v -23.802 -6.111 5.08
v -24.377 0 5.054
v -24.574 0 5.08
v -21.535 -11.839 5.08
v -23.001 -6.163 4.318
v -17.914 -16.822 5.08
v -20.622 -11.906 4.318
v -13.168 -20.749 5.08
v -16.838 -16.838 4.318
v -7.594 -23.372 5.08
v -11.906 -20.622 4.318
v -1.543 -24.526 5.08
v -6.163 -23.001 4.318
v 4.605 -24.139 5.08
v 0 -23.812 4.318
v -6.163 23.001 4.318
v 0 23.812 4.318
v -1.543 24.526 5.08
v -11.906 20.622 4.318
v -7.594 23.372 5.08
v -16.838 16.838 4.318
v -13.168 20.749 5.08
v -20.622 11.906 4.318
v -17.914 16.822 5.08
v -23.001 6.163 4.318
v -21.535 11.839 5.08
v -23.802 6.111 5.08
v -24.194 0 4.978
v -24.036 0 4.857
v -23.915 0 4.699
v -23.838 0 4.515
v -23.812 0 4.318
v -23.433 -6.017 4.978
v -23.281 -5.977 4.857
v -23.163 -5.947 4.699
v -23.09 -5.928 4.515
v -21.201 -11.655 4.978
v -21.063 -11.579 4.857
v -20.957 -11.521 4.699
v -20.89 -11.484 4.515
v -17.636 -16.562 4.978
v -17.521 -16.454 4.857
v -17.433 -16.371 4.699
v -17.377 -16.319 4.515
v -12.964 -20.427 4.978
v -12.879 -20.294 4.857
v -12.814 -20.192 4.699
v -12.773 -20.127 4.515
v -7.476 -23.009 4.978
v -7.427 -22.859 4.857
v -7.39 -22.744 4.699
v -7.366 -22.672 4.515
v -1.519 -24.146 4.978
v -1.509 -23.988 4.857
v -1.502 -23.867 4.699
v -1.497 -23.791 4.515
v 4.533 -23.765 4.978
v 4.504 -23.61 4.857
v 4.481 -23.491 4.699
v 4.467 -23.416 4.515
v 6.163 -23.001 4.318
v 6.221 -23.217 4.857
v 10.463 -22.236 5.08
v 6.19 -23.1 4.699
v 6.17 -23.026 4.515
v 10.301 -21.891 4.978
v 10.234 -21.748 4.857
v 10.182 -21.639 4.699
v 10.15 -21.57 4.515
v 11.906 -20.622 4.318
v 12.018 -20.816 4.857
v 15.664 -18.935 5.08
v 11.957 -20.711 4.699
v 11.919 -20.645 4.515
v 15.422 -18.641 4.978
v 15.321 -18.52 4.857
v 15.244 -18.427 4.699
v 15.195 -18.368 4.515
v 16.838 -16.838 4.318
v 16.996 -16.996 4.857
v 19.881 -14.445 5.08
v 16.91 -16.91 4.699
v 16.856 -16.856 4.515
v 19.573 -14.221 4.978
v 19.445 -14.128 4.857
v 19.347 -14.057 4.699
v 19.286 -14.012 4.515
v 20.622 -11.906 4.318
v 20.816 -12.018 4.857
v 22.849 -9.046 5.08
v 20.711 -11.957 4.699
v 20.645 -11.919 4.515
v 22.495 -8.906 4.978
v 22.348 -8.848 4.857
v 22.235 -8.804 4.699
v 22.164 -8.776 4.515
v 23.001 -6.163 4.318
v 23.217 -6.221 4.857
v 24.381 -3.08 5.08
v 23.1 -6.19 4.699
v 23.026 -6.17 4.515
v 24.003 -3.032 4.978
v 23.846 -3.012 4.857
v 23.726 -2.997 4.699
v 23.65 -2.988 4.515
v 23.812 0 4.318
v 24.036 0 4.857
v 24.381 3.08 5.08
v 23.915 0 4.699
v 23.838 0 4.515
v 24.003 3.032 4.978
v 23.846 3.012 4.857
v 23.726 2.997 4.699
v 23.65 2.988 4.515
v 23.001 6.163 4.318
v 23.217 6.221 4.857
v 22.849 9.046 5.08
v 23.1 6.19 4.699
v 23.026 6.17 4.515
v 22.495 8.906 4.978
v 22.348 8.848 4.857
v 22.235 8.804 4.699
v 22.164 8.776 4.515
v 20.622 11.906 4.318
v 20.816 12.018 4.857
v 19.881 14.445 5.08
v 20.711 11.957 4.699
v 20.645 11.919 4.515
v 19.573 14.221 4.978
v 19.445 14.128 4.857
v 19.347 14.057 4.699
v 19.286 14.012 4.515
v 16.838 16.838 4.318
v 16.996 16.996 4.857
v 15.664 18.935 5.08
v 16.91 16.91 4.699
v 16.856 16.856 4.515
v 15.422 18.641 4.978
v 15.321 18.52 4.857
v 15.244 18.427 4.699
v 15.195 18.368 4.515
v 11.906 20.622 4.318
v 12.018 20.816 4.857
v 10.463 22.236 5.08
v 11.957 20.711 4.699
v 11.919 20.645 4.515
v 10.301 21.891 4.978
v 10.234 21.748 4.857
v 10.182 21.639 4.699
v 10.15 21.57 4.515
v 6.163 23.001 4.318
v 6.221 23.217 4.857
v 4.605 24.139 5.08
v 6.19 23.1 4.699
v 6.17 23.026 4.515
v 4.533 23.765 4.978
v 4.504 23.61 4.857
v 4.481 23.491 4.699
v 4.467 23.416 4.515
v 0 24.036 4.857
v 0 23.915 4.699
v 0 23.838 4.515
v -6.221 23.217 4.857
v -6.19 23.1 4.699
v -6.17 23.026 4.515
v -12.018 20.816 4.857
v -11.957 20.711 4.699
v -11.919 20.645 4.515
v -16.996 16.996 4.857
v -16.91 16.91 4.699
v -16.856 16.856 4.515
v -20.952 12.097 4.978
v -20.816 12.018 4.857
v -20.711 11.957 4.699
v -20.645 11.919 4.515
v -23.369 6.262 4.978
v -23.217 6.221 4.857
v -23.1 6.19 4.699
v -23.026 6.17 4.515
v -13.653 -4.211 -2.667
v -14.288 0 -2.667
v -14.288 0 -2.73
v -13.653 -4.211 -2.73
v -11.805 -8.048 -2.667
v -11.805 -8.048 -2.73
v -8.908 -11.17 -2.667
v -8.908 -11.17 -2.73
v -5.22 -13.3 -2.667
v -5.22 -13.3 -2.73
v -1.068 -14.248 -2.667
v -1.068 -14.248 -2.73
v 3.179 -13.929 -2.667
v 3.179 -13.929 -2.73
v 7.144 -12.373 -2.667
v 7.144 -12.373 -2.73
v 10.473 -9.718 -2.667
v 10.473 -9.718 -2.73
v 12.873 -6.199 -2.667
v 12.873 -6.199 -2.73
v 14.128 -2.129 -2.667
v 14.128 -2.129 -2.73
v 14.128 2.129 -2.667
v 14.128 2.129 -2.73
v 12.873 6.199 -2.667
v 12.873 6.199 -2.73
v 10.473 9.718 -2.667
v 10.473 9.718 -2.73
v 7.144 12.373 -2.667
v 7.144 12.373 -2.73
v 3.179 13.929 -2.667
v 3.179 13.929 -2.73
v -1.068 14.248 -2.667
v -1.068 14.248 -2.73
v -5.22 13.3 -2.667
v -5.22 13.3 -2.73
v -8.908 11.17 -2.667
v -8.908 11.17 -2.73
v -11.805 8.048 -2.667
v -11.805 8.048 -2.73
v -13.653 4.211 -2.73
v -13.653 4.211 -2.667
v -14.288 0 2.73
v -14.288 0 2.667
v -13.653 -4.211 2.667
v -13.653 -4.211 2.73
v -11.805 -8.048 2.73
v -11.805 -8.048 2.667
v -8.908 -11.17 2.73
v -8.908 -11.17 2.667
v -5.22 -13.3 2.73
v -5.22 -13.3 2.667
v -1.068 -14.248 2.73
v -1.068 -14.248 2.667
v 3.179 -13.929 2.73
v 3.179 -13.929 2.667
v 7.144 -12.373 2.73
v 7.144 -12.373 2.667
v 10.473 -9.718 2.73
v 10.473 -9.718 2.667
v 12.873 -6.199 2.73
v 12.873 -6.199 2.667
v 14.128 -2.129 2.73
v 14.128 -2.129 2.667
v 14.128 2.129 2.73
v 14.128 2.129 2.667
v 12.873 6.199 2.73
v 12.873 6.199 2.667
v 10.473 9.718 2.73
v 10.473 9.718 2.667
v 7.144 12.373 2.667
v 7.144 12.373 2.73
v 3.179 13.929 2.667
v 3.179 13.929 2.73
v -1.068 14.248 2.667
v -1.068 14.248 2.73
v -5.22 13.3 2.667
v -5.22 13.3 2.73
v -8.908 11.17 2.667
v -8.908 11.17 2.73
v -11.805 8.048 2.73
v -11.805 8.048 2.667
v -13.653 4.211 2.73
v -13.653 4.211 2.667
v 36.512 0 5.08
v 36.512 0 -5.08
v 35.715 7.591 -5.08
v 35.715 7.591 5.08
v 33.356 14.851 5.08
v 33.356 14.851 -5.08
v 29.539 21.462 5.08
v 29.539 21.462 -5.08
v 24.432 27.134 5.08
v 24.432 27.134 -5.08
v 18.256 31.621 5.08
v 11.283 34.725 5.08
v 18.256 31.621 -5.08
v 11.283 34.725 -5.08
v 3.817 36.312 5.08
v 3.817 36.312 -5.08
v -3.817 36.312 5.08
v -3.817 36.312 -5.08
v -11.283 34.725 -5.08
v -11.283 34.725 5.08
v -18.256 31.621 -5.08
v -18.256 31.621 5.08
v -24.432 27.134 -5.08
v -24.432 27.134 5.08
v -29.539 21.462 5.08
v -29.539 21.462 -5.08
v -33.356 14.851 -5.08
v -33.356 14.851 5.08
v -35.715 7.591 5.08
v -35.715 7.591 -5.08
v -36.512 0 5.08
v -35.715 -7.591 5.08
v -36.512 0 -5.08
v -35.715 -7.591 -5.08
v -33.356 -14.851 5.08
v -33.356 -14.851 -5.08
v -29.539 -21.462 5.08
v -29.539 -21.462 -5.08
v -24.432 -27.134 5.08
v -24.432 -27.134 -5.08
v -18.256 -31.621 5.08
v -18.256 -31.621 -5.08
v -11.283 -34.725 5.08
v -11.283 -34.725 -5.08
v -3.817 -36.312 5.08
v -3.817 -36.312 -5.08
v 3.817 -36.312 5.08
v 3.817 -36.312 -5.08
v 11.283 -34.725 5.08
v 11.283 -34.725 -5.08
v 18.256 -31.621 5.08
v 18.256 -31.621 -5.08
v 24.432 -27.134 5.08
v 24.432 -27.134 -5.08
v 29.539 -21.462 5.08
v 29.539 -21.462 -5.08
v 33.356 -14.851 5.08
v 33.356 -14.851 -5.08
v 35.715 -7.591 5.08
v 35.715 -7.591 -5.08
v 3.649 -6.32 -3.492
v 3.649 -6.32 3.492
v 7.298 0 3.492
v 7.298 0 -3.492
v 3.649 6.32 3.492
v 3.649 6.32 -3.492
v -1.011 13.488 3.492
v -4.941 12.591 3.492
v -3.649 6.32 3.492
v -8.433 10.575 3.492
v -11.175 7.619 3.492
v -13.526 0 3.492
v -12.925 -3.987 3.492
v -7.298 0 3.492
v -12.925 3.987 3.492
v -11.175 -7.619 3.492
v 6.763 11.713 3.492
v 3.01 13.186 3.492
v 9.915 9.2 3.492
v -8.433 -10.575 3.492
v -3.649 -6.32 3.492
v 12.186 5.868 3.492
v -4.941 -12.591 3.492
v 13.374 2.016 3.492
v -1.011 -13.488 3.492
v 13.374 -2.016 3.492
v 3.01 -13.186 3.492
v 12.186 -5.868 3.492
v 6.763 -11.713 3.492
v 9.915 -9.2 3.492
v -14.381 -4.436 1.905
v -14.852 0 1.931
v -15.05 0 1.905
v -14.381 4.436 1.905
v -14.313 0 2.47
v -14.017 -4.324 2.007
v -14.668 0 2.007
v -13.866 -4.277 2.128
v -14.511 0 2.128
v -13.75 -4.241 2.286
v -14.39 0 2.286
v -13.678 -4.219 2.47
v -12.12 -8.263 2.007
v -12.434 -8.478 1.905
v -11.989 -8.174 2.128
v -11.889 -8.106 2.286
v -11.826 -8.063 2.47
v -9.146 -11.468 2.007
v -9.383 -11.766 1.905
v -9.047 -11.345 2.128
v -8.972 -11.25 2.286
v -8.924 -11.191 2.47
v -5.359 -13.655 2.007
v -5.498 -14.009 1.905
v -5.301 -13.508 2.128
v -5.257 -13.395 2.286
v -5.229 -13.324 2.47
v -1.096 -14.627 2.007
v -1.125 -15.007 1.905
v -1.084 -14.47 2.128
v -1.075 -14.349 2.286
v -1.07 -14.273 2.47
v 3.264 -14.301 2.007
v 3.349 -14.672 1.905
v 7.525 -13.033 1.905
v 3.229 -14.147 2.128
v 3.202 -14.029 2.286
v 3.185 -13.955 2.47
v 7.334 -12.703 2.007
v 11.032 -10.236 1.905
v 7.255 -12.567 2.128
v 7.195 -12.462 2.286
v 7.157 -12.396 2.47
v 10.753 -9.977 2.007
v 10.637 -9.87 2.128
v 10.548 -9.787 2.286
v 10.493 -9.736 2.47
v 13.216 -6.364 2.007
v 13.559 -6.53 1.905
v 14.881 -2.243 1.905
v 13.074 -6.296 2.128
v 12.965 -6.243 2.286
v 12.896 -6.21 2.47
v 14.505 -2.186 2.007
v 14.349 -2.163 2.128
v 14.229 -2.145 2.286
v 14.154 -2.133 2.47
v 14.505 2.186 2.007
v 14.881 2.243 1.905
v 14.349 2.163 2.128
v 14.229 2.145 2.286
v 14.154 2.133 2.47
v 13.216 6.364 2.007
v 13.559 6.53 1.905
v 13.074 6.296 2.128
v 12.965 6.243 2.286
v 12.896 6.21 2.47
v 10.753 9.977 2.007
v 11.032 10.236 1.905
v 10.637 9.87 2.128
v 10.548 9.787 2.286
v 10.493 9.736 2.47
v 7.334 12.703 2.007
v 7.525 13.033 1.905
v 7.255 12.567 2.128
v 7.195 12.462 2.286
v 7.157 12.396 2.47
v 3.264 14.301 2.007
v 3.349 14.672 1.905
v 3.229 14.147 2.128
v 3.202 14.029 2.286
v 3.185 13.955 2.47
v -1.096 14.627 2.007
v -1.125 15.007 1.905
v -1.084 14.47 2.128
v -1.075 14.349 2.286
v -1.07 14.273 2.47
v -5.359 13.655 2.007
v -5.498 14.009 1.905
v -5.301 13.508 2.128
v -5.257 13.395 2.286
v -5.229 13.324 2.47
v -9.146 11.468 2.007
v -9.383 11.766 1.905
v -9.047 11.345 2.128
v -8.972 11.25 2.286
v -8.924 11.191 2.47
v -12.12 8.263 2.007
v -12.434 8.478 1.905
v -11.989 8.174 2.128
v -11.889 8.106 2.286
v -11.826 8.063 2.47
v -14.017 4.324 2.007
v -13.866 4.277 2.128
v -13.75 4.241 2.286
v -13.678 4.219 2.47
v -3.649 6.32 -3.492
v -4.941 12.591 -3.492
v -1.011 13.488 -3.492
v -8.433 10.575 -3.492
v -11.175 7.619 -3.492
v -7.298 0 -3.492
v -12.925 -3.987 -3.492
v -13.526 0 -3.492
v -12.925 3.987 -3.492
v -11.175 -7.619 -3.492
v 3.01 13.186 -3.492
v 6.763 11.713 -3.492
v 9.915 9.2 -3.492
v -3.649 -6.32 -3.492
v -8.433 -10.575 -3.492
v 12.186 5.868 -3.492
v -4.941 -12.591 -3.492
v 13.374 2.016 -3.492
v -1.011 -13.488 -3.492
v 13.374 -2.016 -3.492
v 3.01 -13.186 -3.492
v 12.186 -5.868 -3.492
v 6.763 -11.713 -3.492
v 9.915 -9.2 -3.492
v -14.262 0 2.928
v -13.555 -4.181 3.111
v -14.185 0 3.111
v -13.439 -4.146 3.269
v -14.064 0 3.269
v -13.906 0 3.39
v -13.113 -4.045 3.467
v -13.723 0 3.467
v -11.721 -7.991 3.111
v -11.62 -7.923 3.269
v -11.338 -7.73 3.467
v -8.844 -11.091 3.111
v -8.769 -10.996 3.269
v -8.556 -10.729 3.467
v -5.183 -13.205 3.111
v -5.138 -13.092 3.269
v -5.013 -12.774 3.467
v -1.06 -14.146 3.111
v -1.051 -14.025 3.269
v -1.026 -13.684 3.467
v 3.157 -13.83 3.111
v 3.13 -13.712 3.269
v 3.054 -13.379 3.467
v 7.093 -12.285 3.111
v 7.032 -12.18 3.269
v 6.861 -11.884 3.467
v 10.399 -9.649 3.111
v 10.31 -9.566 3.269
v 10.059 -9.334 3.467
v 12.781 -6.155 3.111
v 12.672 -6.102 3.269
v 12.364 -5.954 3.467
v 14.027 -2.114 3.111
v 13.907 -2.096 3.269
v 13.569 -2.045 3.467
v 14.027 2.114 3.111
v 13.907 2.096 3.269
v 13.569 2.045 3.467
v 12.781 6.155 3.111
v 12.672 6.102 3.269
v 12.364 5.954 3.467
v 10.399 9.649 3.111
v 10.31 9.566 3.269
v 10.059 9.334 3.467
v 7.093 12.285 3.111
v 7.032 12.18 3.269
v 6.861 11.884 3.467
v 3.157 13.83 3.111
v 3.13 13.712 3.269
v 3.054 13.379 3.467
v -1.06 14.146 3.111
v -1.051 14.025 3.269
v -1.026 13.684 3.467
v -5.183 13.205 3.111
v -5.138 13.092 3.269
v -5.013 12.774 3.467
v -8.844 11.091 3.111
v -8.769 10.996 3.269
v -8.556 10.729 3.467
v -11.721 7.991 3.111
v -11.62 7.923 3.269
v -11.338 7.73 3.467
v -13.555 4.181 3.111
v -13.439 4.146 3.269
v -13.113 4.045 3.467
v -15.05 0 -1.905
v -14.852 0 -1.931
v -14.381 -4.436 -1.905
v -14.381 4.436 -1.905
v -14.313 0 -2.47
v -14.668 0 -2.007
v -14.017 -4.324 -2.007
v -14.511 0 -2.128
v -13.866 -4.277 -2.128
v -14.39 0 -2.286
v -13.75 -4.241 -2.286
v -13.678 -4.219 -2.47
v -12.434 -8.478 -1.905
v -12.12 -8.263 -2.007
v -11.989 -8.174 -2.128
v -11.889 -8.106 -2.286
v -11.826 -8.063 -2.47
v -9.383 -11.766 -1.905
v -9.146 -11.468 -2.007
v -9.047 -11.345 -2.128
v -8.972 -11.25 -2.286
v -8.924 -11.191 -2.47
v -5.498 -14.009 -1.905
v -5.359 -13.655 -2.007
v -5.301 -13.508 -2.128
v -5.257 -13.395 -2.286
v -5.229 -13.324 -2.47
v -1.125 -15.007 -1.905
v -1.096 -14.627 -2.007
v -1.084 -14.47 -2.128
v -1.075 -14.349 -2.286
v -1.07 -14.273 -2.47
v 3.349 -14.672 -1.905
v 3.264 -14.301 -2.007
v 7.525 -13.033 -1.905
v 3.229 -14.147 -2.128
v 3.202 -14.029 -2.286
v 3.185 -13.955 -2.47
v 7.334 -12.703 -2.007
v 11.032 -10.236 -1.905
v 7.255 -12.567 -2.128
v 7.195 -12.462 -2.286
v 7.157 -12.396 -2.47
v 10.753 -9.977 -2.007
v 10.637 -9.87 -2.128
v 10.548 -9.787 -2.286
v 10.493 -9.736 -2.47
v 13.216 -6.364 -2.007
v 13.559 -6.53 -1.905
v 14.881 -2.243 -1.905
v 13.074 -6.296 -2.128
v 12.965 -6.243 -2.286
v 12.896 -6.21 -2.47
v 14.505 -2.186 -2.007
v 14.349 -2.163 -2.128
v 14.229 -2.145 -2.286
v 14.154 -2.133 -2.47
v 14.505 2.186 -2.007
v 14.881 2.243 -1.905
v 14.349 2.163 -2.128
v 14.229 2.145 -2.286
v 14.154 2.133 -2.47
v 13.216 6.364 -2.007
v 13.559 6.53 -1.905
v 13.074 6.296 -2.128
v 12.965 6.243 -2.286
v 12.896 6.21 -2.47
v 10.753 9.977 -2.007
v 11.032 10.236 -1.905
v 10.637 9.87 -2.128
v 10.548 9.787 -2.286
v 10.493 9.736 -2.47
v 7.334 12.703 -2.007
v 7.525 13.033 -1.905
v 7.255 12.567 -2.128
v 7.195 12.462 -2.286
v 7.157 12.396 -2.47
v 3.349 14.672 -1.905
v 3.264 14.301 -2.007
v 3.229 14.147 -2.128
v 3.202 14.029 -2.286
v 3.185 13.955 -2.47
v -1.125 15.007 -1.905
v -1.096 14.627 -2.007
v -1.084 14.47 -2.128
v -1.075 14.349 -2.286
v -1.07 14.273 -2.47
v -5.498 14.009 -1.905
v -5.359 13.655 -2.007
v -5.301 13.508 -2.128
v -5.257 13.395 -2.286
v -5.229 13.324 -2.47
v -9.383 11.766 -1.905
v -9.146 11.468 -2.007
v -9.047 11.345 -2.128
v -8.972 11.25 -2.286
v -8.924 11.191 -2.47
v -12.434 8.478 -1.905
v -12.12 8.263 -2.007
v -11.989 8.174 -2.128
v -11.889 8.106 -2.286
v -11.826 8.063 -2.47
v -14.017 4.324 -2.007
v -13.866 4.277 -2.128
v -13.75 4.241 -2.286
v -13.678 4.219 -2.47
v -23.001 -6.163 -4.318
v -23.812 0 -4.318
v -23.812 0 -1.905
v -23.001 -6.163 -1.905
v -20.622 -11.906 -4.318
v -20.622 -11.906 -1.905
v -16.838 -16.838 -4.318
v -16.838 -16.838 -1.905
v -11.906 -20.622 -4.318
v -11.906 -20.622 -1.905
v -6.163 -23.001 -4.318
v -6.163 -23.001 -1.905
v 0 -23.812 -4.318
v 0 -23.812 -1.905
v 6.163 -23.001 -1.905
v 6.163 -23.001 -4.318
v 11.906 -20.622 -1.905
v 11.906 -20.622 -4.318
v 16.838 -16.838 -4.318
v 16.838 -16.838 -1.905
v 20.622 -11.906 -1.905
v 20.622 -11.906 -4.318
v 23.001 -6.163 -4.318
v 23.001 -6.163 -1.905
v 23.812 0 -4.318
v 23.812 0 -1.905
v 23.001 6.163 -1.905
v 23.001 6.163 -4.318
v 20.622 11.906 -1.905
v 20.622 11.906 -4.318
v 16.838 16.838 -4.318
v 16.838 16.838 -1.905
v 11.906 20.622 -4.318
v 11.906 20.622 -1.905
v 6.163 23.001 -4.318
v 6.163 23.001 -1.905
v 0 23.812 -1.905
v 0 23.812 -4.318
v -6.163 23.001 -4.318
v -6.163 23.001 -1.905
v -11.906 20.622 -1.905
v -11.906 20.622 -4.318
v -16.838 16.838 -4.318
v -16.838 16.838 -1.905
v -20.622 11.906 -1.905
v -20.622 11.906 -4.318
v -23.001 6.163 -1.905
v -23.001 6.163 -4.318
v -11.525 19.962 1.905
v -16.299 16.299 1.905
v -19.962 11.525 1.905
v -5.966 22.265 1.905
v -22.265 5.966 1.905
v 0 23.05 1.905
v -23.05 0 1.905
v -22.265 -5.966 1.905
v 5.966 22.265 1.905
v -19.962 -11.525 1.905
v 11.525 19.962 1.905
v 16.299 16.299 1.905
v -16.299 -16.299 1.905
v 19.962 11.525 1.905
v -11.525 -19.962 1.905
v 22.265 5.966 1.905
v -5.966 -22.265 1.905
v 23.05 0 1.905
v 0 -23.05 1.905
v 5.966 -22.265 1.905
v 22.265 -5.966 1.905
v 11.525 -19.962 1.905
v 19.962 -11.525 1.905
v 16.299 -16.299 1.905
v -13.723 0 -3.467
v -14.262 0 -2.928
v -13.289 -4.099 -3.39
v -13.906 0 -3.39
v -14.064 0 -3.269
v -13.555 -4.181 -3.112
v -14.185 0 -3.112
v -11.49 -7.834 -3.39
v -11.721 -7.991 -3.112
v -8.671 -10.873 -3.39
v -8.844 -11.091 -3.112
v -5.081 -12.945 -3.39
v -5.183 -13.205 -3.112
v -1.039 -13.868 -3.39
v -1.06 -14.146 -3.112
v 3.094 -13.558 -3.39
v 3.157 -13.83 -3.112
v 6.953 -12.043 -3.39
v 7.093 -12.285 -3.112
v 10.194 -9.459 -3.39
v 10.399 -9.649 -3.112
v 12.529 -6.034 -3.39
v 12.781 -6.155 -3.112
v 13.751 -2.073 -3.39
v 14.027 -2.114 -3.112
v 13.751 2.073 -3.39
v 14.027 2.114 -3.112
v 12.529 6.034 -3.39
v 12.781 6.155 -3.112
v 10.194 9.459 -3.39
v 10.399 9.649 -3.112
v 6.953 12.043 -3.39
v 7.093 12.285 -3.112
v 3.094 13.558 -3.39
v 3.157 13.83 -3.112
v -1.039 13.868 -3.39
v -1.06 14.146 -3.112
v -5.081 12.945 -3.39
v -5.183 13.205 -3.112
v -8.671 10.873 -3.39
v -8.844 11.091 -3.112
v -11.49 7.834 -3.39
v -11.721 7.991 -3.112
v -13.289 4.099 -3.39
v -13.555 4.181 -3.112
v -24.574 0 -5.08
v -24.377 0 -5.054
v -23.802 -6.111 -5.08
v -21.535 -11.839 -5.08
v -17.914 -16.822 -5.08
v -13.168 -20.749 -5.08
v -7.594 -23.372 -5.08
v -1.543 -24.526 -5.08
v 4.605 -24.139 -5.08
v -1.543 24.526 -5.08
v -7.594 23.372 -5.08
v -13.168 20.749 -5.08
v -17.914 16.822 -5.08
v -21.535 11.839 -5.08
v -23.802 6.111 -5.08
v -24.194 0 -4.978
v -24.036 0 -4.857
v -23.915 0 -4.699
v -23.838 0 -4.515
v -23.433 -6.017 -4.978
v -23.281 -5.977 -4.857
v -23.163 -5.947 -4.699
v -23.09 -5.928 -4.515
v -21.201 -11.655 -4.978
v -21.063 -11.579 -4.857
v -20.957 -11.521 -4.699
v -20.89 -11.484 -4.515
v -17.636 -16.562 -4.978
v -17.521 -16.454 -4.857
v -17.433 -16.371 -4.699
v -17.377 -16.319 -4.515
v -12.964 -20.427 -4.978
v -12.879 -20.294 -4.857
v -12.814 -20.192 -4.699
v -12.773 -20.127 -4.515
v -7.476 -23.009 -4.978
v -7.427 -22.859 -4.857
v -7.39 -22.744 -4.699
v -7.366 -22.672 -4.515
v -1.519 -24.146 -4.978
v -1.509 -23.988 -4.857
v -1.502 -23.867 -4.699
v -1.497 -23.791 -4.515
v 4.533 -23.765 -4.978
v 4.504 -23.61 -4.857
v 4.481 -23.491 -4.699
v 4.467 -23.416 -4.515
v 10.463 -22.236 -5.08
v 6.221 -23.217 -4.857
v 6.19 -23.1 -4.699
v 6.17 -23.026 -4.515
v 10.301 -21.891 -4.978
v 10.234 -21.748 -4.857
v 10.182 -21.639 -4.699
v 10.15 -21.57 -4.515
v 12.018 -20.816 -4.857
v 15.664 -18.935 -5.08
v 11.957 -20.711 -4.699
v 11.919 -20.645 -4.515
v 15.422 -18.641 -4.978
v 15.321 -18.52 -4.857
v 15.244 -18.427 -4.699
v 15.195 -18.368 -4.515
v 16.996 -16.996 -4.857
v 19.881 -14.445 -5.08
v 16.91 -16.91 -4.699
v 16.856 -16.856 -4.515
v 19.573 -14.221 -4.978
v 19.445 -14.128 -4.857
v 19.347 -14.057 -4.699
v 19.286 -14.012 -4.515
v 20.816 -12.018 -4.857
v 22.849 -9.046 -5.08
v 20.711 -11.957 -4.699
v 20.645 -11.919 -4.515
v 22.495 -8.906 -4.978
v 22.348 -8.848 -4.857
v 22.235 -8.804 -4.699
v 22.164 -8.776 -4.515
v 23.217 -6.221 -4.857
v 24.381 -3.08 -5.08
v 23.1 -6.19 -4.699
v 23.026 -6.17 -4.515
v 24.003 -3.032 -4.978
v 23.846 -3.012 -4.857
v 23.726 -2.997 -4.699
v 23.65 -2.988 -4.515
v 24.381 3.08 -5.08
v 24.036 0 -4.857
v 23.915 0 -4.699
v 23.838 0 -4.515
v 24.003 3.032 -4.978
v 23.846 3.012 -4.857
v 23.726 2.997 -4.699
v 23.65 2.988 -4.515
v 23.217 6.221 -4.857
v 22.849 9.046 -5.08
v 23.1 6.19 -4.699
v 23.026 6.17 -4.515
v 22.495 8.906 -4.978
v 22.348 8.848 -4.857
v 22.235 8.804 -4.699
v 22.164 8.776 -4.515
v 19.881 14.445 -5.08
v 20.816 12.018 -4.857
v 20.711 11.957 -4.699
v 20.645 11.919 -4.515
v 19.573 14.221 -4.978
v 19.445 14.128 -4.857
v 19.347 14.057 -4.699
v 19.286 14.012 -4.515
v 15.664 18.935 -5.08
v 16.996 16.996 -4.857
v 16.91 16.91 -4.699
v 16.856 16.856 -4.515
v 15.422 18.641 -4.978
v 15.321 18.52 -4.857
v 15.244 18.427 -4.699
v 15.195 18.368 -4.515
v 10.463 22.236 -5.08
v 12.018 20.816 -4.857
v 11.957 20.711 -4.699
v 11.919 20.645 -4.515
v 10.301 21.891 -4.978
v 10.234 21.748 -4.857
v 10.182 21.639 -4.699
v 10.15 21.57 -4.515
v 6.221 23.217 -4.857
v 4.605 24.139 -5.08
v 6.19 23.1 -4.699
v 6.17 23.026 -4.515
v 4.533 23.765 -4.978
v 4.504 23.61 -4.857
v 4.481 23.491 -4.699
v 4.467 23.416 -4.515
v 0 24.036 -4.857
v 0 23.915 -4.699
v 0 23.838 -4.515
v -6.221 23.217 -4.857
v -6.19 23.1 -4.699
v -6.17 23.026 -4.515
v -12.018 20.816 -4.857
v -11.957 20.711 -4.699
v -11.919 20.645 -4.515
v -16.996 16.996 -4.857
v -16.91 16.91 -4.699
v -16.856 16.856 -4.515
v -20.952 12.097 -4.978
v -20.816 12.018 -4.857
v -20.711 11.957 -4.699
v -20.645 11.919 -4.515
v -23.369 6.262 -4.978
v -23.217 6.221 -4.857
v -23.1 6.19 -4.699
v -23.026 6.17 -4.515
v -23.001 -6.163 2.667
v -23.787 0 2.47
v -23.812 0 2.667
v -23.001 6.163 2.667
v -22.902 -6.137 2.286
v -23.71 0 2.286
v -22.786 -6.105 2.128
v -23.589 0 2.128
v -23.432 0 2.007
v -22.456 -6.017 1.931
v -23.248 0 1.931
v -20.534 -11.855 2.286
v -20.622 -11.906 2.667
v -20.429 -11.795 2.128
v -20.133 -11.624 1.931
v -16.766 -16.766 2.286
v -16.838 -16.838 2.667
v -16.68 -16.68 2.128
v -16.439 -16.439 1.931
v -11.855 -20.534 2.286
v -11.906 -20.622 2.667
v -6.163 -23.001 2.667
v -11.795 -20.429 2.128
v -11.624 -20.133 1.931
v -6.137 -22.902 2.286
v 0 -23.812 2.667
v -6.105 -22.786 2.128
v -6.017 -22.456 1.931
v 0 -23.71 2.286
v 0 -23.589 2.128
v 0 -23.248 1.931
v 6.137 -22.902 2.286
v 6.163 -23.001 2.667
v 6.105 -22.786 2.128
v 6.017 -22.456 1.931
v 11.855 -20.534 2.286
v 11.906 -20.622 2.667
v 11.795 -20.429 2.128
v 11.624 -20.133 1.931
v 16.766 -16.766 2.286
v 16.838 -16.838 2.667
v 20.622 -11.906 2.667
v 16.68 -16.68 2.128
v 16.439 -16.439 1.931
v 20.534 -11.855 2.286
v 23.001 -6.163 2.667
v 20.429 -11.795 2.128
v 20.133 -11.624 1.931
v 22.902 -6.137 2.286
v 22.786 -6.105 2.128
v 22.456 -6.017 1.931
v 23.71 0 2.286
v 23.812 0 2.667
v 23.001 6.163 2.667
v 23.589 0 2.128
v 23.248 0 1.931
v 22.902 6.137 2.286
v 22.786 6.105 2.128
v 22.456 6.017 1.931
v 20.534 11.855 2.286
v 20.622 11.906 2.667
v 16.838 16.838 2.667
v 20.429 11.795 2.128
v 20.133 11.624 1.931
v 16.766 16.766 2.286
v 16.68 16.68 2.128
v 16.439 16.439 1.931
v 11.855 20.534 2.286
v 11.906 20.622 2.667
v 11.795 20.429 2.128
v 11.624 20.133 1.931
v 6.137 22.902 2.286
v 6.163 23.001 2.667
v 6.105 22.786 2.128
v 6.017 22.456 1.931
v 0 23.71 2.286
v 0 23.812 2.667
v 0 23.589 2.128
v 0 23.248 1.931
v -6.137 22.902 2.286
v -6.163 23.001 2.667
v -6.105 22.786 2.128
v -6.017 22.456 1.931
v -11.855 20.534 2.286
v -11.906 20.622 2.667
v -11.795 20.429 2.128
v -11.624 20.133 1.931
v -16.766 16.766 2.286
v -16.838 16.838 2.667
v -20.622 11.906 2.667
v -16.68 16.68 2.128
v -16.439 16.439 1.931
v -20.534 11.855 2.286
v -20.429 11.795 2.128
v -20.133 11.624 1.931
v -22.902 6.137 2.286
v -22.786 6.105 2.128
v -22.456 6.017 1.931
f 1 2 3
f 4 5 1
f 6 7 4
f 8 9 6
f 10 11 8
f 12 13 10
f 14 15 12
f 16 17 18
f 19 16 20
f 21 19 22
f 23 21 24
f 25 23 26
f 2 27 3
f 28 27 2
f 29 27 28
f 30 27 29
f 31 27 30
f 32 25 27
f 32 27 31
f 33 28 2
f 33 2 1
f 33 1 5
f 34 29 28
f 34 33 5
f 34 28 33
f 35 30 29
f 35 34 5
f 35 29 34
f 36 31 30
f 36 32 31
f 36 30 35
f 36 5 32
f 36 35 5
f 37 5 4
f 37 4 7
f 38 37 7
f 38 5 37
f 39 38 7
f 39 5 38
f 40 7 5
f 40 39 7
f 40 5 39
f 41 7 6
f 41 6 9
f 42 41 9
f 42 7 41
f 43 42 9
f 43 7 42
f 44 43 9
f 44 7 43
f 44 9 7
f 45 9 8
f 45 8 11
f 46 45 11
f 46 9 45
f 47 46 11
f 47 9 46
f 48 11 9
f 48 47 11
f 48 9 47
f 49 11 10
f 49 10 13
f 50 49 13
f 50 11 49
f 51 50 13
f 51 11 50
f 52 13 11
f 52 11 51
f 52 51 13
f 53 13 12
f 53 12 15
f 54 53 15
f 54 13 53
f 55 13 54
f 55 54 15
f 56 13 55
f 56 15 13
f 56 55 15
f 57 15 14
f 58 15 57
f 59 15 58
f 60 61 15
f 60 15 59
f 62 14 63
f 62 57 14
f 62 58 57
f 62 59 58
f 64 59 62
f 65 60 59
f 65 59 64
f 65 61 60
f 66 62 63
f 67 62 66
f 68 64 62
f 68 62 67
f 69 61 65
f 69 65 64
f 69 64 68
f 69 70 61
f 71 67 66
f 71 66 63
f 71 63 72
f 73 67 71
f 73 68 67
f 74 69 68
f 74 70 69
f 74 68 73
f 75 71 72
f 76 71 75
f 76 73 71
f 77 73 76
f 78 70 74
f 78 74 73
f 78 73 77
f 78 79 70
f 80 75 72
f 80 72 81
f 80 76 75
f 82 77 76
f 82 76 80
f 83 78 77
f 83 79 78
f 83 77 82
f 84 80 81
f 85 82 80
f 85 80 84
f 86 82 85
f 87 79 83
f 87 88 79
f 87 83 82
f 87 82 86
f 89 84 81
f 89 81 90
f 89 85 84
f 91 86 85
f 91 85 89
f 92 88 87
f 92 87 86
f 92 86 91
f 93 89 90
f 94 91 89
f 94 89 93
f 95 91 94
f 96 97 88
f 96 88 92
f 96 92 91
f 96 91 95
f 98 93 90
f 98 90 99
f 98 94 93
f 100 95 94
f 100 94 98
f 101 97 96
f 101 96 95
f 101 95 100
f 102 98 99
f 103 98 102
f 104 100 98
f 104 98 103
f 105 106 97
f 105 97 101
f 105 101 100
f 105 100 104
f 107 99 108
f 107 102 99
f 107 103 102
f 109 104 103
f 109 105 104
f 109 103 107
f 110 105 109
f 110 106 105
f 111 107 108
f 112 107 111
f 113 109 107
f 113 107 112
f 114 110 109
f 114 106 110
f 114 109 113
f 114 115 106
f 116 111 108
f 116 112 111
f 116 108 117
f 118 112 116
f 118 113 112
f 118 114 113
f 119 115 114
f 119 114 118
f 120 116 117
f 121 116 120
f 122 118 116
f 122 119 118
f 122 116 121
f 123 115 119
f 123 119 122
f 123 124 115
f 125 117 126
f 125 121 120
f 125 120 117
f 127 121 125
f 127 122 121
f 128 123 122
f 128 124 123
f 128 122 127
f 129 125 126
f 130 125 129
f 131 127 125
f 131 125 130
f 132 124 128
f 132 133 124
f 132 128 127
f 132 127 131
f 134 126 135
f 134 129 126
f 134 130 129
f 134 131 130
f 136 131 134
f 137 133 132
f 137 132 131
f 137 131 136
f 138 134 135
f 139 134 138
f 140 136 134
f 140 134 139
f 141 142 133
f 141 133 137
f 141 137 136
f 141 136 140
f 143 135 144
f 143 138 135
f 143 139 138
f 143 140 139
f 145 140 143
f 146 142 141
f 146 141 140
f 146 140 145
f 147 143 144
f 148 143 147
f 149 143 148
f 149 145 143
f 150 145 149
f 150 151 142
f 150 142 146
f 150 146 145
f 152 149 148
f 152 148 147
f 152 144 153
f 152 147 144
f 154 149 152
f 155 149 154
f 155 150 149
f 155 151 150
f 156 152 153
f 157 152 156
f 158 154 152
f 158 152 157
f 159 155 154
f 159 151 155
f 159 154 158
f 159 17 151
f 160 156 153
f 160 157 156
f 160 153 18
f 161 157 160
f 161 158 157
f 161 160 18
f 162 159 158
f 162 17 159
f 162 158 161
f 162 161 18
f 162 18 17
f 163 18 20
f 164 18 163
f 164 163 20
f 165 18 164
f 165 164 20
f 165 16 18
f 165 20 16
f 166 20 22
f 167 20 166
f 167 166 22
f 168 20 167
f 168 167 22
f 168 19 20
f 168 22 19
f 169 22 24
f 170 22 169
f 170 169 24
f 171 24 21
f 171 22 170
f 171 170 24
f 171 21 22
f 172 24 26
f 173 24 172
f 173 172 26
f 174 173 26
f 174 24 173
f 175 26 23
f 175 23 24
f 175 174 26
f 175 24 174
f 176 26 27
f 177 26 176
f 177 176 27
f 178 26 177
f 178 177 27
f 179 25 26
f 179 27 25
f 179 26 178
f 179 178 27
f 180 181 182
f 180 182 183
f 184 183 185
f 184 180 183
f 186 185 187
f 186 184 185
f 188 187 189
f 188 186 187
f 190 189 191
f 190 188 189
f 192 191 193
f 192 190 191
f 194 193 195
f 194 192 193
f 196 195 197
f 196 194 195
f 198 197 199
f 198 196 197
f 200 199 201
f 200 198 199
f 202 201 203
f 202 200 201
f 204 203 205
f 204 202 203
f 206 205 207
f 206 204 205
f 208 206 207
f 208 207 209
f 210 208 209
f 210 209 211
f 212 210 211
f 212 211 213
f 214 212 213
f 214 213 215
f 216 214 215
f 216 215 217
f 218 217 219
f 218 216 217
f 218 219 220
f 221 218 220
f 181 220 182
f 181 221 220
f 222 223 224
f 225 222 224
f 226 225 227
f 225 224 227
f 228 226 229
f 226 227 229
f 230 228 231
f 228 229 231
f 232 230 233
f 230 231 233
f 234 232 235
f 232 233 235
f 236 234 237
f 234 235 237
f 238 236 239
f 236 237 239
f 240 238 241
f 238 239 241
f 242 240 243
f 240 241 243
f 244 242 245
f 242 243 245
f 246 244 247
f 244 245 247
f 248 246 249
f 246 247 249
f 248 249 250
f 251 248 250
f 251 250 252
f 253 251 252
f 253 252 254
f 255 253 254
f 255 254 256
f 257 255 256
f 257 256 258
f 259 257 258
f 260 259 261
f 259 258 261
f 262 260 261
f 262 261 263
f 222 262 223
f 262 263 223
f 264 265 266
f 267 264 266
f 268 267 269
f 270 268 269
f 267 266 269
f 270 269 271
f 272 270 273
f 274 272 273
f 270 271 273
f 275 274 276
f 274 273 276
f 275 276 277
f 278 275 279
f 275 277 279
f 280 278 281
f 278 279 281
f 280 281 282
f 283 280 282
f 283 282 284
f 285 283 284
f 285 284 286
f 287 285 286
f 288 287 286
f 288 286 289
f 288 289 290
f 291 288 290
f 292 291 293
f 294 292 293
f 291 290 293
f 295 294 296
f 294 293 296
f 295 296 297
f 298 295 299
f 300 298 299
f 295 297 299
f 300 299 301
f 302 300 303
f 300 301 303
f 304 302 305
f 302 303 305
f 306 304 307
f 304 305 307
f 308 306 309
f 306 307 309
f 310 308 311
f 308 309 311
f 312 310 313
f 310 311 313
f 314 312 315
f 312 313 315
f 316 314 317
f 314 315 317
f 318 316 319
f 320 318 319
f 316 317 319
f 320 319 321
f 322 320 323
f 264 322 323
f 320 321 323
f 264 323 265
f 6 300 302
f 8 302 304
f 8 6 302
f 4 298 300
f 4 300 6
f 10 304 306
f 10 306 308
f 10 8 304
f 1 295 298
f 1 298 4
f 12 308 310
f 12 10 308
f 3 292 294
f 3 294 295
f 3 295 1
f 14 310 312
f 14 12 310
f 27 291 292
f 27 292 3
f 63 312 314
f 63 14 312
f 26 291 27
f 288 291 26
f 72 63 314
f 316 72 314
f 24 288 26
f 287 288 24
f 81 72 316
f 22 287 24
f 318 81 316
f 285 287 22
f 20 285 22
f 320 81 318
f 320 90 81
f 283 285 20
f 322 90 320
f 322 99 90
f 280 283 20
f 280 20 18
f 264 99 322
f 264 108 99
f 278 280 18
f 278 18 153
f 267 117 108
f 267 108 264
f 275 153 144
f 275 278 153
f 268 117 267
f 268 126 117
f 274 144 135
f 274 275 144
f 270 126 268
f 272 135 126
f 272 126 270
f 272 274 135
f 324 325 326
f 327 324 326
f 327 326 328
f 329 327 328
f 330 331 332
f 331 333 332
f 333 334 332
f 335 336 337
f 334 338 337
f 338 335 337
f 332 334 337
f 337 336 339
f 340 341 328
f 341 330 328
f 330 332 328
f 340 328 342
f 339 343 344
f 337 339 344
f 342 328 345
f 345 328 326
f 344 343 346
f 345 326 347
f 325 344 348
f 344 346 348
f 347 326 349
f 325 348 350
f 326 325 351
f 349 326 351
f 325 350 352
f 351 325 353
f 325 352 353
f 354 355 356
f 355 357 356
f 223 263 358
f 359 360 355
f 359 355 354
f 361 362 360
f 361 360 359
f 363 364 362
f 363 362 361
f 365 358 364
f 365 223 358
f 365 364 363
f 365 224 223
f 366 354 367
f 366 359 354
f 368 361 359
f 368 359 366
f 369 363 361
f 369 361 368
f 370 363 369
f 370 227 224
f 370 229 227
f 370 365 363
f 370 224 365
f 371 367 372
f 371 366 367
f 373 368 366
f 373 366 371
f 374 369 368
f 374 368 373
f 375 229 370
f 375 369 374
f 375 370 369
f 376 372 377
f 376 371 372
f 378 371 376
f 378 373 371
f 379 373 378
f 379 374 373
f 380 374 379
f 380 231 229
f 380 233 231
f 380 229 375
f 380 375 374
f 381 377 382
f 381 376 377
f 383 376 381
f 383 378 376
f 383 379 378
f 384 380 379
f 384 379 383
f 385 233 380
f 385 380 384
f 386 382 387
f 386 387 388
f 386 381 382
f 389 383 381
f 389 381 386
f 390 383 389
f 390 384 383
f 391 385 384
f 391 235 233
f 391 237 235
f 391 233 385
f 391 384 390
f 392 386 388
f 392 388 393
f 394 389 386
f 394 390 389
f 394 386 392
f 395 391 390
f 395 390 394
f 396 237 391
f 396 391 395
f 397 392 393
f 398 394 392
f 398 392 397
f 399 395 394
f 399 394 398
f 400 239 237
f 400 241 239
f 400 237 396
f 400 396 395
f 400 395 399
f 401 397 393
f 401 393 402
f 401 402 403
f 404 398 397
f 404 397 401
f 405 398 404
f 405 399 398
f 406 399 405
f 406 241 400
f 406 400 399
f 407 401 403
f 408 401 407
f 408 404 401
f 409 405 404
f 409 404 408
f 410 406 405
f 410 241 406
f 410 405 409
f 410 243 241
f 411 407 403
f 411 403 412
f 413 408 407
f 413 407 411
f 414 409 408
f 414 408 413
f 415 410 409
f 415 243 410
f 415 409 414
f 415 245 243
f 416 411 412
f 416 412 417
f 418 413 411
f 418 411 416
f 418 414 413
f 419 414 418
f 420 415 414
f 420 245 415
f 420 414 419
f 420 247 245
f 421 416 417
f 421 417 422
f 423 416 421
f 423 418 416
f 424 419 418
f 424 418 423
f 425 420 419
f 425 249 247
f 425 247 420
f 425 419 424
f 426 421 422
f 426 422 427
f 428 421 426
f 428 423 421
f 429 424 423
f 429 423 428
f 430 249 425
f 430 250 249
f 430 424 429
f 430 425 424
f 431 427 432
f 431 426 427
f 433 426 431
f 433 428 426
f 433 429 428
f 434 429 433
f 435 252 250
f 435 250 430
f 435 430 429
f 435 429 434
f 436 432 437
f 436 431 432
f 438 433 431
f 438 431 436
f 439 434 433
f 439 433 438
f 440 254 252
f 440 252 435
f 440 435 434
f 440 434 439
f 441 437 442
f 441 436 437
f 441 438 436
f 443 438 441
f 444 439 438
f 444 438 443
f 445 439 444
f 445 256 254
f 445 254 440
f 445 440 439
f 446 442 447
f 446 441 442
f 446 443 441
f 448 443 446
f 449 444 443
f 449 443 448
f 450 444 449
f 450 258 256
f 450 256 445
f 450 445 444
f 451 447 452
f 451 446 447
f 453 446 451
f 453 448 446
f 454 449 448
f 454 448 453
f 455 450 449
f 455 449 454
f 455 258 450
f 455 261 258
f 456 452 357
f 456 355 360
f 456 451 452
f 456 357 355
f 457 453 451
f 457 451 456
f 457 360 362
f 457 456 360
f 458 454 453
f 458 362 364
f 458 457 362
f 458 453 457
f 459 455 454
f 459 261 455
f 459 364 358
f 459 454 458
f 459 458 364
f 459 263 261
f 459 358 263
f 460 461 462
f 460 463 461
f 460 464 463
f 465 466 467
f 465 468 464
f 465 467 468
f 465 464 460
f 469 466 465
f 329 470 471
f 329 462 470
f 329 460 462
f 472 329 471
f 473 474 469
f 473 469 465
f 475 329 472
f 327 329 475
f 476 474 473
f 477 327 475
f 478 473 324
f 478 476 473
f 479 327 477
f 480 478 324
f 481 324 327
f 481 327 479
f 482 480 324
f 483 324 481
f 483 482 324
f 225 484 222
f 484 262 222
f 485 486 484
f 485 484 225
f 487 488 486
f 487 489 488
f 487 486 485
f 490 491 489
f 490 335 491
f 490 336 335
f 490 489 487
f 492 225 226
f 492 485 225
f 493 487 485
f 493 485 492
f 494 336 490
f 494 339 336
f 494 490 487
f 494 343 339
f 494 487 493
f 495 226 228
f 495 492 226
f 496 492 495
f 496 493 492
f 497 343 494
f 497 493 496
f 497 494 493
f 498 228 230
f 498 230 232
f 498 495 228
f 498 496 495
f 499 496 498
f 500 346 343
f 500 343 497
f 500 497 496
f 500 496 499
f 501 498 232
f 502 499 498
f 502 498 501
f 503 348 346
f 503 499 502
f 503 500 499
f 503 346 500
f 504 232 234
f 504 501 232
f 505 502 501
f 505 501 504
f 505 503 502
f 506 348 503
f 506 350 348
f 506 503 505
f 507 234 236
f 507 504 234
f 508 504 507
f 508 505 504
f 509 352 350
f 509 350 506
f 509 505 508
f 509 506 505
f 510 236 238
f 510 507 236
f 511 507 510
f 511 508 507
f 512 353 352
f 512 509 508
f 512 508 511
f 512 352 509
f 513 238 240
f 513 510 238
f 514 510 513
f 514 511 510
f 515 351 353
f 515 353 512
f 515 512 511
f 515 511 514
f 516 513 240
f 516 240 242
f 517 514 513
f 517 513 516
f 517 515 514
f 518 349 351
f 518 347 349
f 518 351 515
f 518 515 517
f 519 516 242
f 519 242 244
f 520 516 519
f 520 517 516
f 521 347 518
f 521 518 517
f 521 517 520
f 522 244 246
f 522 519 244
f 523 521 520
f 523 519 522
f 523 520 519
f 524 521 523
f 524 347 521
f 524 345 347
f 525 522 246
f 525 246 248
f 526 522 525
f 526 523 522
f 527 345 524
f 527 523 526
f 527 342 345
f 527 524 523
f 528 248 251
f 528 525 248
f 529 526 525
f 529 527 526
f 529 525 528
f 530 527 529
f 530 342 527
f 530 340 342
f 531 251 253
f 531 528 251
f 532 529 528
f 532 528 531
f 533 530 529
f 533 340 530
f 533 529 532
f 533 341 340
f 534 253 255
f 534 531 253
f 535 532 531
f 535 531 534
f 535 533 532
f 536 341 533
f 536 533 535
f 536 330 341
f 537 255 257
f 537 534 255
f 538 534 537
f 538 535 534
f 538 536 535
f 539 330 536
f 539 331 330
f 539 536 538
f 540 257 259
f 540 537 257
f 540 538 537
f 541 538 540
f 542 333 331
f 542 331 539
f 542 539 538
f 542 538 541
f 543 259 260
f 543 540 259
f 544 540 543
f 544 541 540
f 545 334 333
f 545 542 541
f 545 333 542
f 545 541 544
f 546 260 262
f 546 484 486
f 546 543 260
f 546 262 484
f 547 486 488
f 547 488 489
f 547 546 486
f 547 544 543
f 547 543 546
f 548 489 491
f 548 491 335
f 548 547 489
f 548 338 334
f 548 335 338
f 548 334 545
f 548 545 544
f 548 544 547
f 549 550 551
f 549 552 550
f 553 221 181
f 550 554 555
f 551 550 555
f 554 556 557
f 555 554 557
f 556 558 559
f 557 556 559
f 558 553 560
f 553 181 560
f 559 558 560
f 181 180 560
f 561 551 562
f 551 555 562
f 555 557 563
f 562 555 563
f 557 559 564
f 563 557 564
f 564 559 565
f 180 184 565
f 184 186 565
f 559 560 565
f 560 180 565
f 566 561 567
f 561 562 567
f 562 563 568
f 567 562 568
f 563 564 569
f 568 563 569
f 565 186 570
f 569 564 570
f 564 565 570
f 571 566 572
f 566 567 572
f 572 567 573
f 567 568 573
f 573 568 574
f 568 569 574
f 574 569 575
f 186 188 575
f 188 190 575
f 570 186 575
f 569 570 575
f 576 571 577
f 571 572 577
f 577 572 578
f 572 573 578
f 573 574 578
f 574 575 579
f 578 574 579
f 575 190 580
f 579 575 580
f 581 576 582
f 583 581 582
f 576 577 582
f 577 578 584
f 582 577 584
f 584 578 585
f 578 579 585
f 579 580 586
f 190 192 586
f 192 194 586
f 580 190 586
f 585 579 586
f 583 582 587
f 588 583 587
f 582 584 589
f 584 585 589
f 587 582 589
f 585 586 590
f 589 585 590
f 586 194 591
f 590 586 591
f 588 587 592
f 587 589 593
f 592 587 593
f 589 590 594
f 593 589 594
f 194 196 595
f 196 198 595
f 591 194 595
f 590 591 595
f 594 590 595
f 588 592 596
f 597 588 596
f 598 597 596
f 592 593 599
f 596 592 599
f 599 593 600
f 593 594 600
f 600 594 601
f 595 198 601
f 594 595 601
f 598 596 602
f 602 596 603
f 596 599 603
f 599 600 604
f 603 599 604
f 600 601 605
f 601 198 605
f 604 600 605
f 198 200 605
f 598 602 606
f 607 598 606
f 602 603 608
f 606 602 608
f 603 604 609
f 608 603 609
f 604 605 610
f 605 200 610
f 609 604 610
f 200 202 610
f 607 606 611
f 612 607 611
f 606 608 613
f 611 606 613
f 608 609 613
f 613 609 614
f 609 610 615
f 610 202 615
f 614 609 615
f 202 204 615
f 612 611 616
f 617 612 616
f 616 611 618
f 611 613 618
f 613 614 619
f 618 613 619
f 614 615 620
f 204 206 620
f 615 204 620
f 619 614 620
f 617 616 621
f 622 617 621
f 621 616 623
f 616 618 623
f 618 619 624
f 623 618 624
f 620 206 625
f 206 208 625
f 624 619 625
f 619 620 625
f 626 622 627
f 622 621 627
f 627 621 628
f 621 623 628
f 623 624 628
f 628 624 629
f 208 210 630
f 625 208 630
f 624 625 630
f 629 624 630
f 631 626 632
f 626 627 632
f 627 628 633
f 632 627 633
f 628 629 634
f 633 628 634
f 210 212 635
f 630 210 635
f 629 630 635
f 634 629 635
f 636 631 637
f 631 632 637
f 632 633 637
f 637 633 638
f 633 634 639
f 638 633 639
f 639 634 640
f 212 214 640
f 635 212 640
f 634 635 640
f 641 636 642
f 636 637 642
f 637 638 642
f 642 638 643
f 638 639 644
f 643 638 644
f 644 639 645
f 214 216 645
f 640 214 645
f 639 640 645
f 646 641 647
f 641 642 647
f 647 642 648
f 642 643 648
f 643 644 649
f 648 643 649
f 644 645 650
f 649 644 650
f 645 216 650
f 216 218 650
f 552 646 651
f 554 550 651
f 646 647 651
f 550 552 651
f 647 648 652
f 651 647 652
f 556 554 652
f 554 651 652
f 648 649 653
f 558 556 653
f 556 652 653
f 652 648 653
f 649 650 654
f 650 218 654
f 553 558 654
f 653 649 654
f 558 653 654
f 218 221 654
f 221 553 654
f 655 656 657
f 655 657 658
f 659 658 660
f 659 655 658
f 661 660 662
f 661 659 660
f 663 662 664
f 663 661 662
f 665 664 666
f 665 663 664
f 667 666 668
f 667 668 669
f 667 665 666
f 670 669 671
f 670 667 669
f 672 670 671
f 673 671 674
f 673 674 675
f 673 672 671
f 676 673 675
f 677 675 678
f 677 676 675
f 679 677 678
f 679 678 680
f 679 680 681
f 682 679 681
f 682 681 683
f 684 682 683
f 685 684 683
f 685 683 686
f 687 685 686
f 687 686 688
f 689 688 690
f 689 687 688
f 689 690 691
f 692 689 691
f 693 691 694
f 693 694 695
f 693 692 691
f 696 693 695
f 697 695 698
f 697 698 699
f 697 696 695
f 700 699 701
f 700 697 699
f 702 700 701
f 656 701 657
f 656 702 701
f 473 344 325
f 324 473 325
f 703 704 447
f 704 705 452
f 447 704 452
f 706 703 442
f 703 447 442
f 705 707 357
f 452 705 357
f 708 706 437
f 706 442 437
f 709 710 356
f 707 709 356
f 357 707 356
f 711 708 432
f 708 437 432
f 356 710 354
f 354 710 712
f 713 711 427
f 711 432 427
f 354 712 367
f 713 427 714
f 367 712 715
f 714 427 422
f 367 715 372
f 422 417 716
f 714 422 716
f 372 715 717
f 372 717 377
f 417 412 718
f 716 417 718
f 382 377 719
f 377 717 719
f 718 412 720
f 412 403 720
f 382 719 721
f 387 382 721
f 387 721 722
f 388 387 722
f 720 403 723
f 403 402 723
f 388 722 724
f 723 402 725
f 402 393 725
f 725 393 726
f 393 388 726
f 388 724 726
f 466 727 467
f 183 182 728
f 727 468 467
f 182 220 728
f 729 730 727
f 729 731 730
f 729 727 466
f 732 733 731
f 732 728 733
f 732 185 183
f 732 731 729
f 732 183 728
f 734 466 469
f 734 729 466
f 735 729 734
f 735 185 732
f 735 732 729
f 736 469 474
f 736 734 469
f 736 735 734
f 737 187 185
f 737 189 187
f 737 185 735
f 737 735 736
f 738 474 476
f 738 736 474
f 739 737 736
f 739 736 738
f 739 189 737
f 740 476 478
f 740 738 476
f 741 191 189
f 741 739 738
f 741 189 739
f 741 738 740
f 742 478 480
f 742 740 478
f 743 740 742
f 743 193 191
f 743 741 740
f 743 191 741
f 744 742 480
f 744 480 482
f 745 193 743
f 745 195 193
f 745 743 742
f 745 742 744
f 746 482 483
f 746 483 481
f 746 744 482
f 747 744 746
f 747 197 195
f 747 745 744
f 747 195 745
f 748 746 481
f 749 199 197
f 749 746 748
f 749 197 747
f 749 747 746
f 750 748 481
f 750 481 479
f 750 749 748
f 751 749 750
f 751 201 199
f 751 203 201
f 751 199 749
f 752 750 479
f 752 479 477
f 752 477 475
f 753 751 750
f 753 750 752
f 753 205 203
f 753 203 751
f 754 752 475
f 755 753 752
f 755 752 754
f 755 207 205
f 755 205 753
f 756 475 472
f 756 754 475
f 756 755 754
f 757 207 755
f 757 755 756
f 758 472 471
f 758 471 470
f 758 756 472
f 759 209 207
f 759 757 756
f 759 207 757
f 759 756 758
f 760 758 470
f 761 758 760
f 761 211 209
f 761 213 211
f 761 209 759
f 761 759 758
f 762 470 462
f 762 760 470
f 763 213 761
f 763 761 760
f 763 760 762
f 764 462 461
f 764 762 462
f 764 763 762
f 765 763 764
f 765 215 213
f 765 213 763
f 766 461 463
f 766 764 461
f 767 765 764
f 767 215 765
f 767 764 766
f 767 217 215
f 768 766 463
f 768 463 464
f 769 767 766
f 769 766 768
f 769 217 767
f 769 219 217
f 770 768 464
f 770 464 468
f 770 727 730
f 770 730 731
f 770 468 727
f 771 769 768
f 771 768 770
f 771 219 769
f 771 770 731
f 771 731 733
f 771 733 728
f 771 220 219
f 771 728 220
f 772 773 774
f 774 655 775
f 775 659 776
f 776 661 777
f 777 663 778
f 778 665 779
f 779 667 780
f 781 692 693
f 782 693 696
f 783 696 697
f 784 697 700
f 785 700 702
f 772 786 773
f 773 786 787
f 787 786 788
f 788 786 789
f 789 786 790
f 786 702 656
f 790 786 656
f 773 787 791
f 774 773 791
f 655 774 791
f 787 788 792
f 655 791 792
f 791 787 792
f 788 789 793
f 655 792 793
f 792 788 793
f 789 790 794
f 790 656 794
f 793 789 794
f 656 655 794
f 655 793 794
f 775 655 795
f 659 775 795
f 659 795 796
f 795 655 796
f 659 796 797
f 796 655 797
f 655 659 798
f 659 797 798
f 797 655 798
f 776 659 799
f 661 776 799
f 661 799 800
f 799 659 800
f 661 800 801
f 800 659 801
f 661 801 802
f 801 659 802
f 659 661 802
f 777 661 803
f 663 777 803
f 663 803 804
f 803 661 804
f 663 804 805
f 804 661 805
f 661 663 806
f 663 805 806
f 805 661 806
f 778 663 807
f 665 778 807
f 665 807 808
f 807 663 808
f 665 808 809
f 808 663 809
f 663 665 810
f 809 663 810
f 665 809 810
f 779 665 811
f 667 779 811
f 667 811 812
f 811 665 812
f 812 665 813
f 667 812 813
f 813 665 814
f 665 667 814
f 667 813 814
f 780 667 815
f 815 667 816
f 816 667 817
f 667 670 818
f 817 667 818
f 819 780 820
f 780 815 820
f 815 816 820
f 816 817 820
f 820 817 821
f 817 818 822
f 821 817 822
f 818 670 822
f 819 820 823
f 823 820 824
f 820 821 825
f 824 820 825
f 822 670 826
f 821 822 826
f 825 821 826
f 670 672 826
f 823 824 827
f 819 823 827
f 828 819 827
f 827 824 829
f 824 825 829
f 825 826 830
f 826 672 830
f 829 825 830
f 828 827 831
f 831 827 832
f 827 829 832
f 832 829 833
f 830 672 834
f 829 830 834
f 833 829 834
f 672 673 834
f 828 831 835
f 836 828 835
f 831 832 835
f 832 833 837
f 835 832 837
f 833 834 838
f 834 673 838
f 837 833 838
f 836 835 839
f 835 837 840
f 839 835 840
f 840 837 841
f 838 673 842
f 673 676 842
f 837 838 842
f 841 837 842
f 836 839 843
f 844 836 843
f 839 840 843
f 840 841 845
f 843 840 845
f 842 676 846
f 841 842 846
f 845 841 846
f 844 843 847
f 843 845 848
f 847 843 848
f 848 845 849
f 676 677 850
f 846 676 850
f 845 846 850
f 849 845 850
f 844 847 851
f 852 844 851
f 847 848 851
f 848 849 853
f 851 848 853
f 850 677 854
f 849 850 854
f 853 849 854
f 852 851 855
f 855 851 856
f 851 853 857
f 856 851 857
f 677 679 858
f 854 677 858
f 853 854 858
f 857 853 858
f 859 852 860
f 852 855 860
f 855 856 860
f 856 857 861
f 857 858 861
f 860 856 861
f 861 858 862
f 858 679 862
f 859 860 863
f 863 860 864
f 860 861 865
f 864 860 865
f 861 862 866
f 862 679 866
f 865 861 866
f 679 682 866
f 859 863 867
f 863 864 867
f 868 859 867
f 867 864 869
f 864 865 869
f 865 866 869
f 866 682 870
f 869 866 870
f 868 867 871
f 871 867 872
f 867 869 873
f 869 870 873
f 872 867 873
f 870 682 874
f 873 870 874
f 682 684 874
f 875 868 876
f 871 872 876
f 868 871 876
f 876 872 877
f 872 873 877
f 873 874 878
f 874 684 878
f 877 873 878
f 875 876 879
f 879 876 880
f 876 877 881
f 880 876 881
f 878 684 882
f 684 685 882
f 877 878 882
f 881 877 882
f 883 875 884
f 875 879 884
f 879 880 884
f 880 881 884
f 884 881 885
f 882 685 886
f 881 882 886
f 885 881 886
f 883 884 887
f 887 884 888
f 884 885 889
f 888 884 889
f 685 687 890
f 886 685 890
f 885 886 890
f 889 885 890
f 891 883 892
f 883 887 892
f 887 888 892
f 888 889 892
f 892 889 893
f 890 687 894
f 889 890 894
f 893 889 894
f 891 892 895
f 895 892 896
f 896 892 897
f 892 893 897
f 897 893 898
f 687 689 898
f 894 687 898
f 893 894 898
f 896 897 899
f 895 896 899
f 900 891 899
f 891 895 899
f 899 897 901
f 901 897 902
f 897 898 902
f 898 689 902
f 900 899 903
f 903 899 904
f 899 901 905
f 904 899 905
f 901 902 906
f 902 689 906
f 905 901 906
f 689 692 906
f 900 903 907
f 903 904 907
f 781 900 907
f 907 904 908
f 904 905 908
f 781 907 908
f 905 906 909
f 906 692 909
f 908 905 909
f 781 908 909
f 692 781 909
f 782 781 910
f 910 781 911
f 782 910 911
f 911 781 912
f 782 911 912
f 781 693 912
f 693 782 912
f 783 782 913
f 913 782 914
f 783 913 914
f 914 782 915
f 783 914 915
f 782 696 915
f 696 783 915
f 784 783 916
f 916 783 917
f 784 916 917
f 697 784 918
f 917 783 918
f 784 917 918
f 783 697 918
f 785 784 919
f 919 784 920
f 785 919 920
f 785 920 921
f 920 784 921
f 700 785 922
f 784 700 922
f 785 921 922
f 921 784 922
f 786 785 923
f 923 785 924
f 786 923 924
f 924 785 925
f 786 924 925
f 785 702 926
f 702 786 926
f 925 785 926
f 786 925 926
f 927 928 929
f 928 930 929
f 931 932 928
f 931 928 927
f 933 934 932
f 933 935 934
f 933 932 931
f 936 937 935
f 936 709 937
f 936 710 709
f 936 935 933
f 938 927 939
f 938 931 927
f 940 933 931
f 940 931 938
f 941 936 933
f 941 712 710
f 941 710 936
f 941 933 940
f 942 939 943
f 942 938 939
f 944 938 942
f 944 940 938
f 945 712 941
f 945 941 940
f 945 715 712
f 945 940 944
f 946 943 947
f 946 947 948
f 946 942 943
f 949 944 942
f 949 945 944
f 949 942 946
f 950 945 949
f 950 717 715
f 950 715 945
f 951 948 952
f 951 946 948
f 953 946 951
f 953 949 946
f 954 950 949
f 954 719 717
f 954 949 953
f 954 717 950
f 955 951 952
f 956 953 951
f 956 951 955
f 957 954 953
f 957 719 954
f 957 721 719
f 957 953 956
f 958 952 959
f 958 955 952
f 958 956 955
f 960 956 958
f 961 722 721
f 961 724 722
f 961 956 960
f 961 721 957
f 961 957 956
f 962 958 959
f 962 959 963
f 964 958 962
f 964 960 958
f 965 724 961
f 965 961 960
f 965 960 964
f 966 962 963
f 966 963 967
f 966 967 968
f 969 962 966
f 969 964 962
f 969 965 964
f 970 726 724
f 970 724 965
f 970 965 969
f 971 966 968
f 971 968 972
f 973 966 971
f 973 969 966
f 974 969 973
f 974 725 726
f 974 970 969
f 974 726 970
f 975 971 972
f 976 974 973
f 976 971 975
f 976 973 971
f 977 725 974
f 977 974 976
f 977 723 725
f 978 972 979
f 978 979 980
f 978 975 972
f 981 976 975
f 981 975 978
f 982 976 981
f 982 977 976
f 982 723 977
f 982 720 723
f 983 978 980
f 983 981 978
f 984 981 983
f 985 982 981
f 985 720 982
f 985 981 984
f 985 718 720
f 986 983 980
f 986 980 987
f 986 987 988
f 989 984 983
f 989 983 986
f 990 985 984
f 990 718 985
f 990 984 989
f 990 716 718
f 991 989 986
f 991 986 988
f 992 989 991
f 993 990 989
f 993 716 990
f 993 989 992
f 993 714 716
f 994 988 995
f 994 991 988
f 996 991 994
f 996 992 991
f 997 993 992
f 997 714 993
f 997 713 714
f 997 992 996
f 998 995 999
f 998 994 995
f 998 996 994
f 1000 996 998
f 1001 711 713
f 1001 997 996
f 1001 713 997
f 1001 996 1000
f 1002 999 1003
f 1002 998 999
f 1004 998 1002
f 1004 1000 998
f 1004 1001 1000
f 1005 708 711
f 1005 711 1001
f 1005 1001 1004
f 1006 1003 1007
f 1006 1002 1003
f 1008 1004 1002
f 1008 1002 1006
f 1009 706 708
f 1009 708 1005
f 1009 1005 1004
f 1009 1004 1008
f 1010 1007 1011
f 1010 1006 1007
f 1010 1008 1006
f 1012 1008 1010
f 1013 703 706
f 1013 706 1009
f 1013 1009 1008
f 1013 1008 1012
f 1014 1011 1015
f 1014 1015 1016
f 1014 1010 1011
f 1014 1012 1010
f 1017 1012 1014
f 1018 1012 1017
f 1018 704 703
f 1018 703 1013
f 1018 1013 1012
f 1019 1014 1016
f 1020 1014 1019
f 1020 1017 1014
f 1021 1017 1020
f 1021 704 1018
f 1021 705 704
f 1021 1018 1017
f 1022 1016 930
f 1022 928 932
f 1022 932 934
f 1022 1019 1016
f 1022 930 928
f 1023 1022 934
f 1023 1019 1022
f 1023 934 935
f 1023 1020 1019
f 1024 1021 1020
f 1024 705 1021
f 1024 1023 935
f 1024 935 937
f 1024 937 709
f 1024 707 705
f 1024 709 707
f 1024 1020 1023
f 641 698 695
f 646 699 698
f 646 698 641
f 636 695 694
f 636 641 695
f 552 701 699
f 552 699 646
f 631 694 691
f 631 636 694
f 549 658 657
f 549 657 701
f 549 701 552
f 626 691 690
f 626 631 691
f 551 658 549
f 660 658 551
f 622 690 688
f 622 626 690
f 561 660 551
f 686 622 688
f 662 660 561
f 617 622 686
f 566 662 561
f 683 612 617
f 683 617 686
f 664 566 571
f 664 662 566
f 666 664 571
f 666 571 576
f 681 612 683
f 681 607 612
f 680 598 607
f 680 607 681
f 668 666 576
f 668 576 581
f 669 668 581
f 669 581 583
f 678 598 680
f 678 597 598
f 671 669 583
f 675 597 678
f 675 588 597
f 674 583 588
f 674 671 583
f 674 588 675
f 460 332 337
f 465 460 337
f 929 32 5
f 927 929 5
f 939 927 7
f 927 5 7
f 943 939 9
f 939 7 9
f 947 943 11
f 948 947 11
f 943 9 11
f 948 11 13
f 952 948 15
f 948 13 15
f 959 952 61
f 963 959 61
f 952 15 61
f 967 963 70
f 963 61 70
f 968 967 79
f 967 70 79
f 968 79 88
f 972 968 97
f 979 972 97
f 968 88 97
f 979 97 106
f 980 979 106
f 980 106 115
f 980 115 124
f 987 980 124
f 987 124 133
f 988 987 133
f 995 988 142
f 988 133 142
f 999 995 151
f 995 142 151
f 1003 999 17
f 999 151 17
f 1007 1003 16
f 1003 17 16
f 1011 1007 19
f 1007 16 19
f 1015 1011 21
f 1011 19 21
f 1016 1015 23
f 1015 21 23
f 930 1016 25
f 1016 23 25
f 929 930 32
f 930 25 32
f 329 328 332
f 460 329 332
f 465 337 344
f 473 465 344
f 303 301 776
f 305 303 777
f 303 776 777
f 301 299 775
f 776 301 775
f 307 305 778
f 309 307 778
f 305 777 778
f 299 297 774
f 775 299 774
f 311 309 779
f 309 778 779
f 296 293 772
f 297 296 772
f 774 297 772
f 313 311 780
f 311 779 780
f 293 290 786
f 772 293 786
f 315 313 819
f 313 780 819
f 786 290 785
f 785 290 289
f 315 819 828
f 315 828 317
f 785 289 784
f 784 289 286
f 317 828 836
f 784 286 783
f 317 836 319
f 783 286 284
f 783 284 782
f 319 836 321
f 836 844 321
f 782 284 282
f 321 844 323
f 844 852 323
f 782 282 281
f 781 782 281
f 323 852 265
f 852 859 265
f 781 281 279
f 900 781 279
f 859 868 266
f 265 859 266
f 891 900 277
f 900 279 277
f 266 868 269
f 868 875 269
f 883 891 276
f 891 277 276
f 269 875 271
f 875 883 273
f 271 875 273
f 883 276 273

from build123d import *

# Parameters (mm, degrees)
BOSS_EXTRUDE1_DEPTH      = 5.08
BOSS_EXTRUDE1_DEPTH_BACK = 5.08
SKETCH1_R                = 36.5125
CUT_EXTRUDE1_DEPTH       = 53.6265229
FILLET1_R                = 0.762
FILLET2_R                = 0.762


with BuildPart() as part:
    # Sketch1 → Boss-Extrude1 (new, two sides: drawn at the far end of the back side and taken through both)
    with BuildSketch(Plane.XY.offset(-BOSS_EXTRUDE1_DEPTH_BACK)):
        Circle(SKETCH1_R)
    extrude(amount=BOSS_EXTRUDE1_DEPTH + BOSS_EXTRUDE1_DEPTH_BACK)

    # Sketch2 → Cut-Extrude1 (cut, through all)
    with BuildSketch(Plane.XY.offset(5.08)):
        Polygon((3.648853701, 6.32), (-3.648853701, 6.32), (-7.297707403, 0), (-3.648853701, -6.32), (3.648853701, -6.32), (7.297707403, 0), align=None)
    extrude(amount=-CUT_EXTRUDE1_DEPTH, mode=Mode.SUBTRACT)

    # Sketch3 → Cut-Revolve1 (revolve, cut)
    with BuildSketch(Plane(origin=(0, 0, 0), x_dir=(0, 0, -1), z_dir=(1, 0, 0))):
        Polygon((3.4925, 14.2875), (1.905, 14.2875), (1.905, 23.8125), (5.08, 23.8125), (5.08, 0), (3.4925, 0), align=None)
    cut_revolve1 = revolve(axis=Axis((0, 0, -22.753035396), (0, 0, 1)), mode=Mode.SUBTRACT)

    # Fillet1
    fillet1_edges = [part.edges().sort_by_distance(p)[0] for p in [
        (0, -14.2875, -1.905),
        (0, -23.8125, -5.08),
        (0, -14.2875, -3.4925),
    ]]
    fillet(fillet1_edges, radius=FILLET1_R)

    # Mirror1: Cut-Revolve1 across plane
    add(cut_revolve1.mirror(Plane.XY), mode=Mode.SUBTRACT)

    # Fillet2
    fillet2_edges = [part.edges().sort_by_distance(p)[0] for p in [
        (0, -23.8125, 5.08),
        (0, -23.8125, 1.905),
        (0, -14.2875, 1.905),
        (0, -14.2875, 3.4925),
    ]]
    fillet(fillet2_edges, radius=FILLET2_R)


solid = part.part
